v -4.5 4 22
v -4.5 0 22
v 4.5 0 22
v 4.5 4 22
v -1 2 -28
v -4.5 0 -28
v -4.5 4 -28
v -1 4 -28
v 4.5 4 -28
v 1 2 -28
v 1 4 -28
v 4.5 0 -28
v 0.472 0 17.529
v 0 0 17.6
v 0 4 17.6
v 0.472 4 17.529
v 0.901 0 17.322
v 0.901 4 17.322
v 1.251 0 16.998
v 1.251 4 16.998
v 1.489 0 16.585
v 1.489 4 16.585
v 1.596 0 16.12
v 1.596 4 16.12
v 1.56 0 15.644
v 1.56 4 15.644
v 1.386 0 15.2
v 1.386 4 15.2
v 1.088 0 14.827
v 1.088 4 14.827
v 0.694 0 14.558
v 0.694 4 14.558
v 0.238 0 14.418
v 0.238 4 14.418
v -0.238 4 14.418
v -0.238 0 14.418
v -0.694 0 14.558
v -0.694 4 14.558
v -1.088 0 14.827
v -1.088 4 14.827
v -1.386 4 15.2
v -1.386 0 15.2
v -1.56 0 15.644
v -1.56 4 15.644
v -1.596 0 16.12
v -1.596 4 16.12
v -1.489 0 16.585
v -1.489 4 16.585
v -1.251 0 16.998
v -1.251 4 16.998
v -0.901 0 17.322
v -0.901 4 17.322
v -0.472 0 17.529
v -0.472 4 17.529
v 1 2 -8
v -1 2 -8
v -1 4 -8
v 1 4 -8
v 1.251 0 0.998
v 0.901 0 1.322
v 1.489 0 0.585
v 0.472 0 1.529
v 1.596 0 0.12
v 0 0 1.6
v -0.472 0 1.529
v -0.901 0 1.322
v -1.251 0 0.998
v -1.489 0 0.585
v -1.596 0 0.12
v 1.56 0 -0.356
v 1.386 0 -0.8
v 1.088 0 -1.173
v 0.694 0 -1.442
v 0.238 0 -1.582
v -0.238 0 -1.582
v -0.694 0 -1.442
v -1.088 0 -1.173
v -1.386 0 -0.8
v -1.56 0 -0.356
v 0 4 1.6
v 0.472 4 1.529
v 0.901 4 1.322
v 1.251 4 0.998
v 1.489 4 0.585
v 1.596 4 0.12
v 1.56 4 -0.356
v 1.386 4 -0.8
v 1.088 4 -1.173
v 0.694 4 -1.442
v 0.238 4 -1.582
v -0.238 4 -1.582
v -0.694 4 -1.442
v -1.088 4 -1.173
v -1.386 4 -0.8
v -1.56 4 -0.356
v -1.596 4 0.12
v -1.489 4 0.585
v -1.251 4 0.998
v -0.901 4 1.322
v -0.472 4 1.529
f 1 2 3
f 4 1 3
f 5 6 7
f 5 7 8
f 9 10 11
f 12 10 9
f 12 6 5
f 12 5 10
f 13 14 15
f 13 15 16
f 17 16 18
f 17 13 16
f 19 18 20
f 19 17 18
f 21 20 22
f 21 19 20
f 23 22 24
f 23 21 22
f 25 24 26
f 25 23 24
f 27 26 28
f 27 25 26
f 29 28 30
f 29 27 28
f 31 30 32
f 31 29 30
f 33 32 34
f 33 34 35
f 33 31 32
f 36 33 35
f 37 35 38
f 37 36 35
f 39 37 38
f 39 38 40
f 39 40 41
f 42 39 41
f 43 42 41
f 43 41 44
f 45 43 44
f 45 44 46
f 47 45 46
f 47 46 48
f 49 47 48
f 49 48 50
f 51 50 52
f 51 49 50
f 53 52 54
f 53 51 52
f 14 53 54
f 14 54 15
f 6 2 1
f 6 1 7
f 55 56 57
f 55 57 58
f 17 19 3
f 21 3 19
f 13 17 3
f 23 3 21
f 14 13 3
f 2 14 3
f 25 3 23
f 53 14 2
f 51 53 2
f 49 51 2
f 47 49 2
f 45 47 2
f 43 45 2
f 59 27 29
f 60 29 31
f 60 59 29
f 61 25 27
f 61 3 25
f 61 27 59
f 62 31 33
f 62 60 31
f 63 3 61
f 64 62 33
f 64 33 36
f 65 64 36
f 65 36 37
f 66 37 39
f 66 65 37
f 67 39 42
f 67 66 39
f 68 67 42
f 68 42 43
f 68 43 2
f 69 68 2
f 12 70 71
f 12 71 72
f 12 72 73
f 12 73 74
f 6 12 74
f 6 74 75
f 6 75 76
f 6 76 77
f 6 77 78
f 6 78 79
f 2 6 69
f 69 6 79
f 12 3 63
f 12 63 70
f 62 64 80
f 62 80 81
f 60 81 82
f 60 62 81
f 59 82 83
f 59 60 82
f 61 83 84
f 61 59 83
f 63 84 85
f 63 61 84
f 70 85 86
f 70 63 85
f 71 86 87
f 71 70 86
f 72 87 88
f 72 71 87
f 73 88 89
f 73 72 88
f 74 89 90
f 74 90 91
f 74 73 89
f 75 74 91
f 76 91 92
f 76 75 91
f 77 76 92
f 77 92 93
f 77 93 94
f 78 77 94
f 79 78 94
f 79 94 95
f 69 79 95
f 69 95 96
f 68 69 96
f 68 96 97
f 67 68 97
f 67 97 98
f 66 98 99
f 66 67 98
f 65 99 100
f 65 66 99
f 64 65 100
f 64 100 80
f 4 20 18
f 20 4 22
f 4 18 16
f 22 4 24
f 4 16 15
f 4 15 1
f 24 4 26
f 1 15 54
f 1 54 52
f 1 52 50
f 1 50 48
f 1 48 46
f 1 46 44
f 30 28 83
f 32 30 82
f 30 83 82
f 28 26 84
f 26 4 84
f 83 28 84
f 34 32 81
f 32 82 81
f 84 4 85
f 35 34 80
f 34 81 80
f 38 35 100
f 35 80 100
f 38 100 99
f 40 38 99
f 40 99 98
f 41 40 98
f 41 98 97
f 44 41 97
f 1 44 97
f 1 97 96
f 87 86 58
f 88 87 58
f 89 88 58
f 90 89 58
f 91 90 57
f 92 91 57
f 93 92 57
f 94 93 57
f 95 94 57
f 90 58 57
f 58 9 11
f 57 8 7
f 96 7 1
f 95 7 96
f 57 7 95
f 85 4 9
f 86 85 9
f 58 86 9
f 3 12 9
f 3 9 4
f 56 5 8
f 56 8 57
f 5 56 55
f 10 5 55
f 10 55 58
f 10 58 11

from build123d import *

# Parameters (mm, degrees)
SKETCH1_R               = 1.6
BOSS_EXTRUDE1_DEPTH     = 4
CUT_EXTRUDE1_DEPTH      = 29.640006983
CUT_EXTRUDE1_DEPTH_BACK = 2


with BuildPart() as part:
    # Sketch1 → Boss-Extrude1 (new body)
    with BuildSketch(Plane(origin=(0, 0, 0), x_dir=(1, 0, 0), z_dir=(0, 1, 0))):
        Polygon((0, -22), (-4.5, -22), (-4.5, 28), (4.5, 28), (4.5, -22), align=None)
        with Locations(Location((0, -16, 0), (0, 0, 270))):
            Circle(SKETCH1_R, mode=Mode.SUBTRACT)
        with Locations(Location((0, 0, 0), (0, 0, 270))):
            Circle(SKETCH1_R, mode=Mode.SUBTRACT)
    extrude(amount=BOSS_EXTRUDE1_DEPTH)

    # Sketch2 → Cut-Extrude1 (cut, two sides: drawn at the far end of the back side and taken through both)
    with BuildSketch(Plane(origin=(0, 4, 0), x_dir=(1, 0, 0), z_dir=(0, 1, 0)).offset(-CUT_EXTRUDE1_DEPTH_BACK)):
        Polygon((-1, 138.603180864), (-1, 28), (-1, 8), (1, 8), (1, 28), (1, 138.603180864), (1, 359.809542593), (-1, 359.809542593), align=None)
    extrude(amount=CUT_EXTRUDE1_DEPTH + CUT_EXTRUDE1_DEPTH_BACK, mode=Mode.SUBTRACT)


solid = part.part
